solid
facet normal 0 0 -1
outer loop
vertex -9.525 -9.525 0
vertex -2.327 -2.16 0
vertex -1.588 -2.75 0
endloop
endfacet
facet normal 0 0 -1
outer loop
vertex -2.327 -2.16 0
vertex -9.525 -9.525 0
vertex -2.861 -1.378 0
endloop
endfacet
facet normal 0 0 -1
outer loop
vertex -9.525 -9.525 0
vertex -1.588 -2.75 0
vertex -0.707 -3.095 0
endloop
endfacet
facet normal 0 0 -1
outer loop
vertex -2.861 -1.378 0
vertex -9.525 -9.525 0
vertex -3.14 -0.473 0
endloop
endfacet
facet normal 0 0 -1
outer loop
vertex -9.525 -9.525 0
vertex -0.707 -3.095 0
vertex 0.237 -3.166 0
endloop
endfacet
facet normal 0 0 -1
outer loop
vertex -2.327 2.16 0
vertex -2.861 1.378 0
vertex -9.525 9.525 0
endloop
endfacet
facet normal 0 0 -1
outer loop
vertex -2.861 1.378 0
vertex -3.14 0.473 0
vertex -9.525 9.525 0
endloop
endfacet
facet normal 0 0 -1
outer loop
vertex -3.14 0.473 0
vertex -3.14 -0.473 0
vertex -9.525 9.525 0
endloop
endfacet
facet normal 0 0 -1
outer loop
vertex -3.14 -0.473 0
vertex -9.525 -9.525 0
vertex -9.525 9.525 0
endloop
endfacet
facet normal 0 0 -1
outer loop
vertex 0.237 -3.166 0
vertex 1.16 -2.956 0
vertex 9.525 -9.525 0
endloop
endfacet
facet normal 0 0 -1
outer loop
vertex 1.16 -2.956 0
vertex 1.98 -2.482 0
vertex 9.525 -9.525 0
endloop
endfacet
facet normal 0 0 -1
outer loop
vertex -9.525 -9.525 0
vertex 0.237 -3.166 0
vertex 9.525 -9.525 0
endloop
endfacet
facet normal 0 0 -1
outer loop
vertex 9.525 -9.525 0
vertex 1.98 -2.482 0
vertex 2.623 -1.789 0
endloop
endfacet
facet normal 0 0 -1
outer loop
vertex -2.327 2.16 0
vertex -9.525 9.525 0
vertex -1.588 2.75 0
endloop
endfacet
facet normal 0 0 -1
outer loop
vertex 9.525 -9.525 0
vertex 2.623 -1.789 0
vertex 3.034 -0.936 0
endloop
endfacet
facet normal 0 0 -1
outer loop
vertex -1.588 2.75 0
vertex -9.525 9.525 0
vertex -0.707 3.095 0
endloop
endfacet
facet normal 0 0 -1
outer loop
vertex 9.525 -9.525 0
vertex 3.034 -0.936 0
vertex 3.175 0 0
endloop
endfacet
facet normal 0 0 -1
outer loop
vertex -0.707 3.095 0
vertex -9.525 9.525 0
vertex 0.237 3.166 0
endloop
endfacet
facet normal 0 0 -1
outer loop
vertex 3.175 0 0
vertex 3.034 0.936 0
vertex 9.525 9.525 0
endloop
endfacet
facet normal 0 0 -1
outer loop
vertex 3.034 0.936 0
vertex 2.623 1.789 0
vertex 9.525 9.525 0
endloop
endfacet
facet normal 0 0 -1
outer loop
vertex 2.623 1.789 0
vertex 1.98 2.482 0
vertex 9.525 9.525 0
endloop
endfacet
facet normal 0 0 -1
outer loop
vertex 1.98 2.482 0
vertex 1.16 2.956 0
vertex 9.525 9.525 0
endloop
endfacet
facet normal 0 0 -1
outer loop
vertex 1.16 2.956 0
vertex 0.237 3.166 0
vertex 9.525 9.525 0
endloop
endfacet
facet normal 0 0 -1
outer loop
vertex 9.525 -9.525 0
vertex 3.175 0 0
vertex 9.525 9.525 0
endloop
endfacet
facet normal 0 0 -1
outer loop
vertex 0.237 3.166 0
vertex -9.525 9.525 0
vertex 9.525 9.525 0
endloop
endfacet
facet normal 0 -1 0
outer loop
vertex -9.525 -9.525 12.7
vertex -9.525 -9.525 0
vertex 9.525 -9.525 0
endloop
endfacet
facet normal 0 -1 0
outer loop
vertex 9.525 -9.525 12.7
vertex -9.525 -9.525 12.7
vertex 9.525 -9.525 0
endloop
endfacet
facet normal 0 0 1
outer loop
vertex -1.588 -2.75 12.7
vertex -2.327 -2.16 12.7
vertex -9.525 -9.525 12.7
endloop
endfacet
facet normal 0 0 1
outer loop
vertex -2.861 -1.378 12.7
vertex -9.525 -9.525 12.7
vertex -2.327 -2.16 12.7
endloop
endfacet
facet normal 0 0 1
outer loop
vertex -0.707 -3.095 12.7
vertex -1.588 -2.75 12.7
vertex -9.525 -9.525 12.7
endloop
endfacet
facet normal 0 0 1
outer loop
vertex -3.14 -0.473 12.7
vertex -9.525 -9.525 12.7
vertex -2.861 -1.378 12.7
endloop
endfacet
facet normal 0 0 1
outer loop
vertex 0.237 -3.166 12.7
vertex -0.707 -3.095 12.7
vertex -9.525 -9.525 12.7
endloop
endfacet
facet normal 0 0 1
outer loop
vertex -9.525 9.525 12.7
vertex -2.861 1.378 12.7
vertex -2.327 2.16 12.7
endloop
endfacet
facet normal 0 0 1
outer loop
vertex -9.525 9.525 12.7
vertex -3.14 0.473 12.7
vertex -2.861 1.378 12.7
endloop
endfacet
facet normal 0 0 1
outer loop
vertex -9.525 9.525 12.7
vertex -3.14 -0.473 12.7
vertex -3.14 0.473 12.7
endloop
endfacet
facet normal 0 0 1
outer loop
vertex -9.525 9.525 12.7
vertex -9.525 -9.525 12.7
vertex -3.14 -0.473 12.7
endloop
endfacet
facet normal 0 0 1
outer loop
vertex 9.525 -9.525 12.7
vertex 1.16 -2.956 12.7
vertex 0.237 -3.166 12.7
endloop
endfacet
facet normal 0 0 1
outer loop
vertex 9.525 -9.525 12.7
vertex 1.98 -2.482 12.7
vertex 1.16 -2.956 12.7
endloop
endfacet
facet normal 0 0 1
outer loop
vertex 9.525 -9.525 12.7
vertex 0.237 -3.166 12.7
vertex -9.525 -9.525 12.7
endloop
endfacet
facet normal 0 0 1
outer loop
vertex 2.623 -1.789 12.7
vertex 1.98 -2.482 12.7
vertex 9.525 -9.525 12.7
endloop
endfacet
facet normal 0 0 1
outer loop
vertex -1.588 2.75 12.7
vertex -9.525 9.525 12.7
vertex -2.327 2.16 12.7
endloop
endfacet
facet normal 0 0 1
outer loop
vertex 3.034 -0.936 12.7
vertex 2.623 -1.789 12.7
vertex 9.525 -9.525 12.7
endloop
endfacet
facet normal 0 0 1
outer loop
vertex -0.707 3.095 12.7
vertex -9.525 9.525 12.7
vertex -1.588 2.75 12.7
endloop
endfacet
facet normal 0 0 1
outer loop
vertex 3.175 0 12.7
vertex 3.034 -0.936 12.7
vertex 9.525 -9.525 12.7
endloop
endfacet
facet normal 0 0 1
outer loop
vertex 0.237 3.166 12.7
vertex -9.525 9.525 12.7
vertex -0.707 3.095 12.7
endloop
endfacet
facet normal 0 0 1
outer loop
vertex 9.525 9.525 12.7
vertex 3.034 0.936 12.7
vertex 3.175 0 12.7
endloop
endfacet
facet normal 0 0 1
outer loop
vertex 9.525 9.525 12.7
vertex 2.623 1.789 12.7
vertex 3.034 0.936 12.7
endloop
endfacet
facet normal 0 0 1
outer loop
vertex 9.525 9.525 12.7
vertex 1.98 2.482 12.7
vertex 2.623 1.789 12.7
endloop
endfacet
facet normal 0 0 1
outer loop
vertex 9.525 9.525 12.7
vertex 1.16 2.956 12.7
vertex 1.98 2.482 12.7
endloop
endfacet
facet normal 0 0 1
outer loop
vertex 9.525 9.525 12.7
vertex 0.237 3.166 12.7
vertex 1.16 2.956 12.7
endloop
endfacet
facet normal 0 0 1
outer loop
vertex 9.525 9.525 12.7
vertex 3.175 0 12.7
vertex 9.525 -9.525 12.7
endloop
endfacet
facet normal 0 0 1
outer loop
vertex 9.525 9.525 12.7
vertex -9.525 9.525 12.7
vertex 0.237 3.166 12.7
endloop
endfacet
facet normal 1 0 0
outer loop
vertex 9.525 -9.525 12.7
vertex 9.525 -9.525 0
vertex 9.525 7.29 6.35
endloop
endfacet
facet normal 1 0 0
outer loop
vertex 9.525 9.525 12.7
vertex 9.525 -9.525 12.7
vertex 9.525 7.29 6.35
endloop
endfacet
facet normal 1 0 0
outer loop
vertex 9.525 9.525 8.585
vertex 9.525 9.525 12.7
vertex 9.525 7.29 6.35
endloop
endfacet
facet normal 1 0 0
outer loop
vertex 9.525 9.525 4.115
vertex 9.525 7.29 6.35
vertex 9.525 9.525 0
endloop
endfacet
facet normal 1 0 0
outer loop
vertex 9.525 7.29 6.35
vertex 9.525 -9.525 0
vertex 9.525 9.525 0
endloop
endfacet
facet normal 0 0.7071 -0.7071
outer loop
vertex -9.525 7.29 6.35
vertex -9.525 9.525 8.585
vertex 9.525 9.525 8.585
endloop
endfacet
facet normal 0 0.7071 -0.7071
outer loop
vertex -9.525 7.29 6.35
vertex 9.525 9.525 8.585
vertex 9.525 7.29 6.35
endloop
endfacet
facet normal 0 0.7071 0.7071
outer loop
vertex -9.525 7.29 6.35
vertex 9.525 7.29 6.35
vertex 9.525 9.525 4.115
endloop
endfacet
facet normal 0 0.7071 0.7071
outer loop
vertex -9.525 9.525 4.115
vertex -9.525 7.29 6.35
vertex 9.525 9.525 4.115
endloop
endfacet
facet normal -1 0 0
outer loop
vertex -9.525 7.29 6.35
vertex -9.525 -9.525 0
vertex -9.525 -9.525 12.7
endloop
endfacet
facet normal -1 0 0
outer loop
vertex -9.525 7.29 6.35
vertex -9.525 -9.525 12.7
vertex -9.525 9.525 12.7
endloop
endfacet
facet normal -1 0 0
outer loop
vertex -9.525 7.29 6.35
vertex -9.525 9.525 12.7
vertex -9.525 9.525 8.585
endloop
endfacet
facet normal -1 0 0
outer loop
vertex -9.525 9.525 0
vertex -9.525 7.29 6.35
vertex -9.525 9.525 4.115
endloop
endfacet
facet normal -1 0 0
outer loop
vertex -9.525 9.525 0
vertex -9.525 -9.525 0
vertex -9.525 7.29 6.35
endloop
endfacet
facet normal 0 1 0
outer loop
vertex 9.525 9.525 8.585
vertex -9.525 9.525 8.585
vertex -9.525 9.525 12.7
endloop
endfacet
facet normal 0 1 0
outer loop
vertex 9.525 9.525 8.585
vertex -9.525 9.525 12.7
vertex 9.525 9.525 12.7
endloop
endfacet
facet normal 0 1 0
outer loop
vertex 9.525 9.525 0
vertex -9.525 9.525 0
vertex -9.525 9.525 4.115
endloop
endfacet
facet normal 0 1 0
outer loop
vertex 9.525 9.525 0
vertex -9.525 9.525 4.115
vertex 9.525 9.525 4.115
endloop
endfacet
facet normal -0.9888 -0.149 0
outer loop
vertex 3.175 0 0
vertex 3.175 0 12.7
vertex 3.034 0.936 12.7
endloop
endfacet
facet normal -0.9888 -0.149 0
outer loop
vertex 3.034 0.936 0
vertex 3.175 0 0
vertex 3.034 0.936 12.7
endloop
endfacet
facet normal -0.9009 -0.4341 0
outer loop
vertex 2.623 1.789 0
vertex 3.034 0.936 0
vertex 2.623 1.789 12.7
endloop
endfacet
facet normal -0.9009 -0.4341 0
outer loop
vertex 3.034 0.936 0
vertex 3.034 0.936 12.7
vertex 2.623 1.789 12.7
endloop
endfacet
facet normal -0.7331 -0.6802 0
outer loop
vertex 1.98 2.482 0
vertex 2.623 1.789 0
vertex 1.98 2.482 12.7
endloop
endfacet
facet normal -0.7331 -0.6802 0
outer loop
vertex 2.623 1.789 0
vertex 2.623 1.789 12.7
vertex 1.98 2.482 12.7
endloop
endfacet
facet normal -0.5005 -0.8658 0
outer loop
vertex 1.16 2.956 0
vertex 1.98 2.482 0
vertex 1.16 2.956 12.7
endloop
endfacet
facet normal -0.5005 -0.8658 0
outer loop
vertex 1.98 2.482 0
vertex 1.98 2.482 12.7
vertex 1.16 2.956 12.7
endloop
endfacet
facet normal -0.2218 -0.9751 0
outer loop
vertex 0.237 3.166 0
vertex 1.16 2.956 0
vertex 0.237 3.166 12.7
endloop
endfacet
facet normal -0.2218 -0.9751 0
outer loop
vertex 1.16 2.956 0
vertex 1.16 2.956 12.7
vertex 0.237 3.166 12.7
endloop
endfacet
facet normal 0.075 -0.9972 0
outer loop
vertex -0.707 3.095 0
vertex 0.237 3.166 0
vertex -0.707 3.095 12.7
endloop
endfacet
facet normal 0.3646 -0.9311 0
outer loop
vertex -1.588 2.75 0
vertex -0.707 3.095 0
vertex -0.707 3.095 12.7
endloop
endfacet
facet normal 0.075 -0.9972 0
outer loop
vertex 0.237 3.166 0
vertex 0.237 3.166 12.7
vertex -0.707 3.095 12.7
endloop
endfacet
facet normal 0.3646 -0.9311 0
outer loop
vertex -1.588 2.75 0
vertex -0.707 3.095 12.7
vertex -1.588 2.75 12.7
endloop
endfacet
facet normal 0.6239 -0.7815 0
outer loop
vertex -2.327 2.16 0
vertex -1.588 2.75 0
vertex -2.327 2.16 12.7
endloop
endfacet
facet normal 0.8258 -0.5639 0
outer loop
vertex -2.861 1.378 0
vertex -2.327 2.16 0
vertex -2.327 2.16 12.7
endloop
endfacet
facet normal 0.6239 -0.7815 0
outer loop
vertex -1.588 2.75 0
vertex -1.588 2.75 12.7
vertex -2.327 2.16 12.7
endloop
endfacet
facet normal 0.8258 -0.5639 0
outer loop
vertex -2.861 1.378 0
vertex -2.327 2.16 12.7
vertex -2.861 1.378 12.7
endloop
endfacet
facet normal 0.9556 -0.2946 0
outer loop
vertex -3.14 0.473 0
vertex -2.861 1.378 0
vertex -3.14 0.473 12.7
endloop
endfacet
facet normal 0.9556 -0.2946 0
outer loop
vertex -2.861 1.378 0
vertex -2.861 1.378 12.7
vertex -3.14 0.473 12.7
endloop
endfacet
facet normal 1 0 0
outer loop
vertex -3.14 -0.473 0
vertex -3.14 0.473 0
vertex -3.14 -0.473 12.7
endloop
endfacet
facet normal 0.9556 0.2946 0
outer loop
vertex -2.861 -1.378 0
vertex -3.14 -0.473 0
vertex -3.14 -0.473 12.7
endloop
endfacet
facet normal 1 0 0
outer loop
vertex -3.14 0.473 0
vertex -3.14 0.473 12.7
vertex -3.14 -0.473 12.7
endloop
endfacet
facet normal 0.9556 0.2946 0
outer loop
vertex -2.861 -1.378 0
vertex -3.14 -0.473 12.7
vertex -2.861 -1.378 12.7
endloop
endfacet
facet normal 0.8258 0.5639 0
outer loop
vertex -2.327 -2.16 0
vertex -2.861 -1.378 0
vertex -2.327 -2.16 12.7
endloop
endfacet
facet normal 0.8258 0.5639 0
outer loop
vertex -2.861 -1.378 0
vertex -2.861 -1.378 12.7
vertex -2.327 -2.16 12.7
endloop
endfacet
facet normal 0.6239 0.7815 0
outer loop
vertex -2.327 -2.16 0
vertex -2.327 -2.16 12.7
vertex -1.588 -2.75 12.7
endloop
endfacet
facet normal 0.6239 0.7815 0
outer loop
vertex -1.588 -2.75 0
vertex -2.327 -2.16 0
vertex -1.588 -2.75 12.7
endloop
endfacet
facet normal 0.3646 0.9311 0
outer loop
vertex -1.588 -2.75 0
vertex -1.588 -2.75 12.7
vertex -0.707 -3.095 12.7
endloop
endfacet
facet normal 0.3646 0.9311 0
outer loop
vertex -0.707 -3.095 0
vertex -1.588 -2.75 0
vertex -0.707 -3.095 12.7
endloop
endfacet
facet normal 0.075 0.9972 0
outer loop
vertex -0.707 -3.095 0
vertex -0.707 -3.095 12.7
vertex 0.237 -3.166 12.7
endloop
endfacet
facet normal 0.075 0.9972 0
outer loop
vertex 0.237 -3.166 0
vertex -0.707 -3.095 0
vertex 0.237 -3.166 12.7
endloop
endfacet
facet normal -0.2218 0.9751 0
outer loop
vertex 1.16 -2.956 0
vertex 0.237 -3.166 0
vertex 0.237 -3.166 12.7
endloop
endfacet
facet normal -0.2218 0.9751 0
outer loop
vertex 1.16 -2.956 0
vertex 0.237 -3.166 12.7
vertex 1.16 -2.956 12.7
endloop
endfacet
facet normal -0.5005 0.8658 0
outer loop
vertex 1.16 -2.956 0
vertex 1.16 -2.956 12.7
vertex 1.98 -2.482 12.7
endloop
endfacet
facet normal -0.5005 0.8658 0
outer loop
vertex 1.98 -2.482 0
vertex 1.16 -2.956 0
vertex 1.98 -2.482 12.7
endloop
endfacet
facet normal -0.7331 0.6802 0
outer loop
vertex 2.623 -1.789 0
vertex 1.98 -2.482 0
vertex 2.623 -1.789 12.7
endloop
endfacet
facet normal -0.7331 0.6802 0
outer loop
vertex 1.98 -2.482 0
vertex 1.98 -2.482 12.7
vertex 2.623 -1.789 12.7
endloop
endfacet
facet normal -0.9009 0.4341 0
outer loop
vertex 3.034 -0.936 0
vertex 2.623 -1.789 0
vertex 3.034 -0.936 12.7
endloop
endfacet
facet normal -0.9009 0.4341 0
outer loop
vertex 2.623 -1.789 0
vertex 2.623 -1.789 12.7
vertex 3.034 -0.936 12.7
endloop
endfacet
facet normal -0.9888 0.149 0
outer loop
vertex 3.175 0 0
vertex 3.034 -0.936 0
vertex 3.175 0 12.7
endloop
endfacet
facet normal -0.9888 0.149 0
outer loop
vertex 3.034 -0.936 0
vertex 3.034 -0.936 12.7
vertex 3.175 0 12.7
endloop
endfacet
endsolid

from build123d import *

# Parameters (mm, degrees)
SKETCH1_W           = 19.05
SKETCH1_H           = 19.05
BOSS_EXTRUDE1_DEPTH = 12.7
SKETCH2_R           = 3.175
CUT_EXTRUDE1_DEPTH  = 12.7
CUT_EXTRUDE2_DEPTH  = 25.797542721


with BuildPart() as part:
    # Sketch1 → Boss-Extrude1 (new body)
    with BuildSketch(Plane.XY):
        Rectangle(SKETCH1_W, SKETCH1_H)
    extrude(amount=BOSS_EXTRUDE1_DEPTH)

    # Sketch2 → Cut-Extrude1 (cut)
    with BuildSketch(Plane.XY.offset(12.7)):
        Circle(SKETCH2_R)
    extrude(amount=-CUT_EXTRUDE1_DEPTH, mode=Mode.SUBTRACT)

    # Sketch3 → Cut-Extrude2 (cut, through all)
    with BuildSketch(Plane(origin=(9.525, 0, 0), x_dir=(0, 0, -1), z_dir=(1, 0, 0))):
        Polygon((-6.35, 7.2898), (-4.1148, 9.525), (-8.5852, 9.525), align=None)
    extrude(amount=-CUT_EXTRUDE2_DEPTH, mode=Mode.SUBTRACT)


solid = part.part
